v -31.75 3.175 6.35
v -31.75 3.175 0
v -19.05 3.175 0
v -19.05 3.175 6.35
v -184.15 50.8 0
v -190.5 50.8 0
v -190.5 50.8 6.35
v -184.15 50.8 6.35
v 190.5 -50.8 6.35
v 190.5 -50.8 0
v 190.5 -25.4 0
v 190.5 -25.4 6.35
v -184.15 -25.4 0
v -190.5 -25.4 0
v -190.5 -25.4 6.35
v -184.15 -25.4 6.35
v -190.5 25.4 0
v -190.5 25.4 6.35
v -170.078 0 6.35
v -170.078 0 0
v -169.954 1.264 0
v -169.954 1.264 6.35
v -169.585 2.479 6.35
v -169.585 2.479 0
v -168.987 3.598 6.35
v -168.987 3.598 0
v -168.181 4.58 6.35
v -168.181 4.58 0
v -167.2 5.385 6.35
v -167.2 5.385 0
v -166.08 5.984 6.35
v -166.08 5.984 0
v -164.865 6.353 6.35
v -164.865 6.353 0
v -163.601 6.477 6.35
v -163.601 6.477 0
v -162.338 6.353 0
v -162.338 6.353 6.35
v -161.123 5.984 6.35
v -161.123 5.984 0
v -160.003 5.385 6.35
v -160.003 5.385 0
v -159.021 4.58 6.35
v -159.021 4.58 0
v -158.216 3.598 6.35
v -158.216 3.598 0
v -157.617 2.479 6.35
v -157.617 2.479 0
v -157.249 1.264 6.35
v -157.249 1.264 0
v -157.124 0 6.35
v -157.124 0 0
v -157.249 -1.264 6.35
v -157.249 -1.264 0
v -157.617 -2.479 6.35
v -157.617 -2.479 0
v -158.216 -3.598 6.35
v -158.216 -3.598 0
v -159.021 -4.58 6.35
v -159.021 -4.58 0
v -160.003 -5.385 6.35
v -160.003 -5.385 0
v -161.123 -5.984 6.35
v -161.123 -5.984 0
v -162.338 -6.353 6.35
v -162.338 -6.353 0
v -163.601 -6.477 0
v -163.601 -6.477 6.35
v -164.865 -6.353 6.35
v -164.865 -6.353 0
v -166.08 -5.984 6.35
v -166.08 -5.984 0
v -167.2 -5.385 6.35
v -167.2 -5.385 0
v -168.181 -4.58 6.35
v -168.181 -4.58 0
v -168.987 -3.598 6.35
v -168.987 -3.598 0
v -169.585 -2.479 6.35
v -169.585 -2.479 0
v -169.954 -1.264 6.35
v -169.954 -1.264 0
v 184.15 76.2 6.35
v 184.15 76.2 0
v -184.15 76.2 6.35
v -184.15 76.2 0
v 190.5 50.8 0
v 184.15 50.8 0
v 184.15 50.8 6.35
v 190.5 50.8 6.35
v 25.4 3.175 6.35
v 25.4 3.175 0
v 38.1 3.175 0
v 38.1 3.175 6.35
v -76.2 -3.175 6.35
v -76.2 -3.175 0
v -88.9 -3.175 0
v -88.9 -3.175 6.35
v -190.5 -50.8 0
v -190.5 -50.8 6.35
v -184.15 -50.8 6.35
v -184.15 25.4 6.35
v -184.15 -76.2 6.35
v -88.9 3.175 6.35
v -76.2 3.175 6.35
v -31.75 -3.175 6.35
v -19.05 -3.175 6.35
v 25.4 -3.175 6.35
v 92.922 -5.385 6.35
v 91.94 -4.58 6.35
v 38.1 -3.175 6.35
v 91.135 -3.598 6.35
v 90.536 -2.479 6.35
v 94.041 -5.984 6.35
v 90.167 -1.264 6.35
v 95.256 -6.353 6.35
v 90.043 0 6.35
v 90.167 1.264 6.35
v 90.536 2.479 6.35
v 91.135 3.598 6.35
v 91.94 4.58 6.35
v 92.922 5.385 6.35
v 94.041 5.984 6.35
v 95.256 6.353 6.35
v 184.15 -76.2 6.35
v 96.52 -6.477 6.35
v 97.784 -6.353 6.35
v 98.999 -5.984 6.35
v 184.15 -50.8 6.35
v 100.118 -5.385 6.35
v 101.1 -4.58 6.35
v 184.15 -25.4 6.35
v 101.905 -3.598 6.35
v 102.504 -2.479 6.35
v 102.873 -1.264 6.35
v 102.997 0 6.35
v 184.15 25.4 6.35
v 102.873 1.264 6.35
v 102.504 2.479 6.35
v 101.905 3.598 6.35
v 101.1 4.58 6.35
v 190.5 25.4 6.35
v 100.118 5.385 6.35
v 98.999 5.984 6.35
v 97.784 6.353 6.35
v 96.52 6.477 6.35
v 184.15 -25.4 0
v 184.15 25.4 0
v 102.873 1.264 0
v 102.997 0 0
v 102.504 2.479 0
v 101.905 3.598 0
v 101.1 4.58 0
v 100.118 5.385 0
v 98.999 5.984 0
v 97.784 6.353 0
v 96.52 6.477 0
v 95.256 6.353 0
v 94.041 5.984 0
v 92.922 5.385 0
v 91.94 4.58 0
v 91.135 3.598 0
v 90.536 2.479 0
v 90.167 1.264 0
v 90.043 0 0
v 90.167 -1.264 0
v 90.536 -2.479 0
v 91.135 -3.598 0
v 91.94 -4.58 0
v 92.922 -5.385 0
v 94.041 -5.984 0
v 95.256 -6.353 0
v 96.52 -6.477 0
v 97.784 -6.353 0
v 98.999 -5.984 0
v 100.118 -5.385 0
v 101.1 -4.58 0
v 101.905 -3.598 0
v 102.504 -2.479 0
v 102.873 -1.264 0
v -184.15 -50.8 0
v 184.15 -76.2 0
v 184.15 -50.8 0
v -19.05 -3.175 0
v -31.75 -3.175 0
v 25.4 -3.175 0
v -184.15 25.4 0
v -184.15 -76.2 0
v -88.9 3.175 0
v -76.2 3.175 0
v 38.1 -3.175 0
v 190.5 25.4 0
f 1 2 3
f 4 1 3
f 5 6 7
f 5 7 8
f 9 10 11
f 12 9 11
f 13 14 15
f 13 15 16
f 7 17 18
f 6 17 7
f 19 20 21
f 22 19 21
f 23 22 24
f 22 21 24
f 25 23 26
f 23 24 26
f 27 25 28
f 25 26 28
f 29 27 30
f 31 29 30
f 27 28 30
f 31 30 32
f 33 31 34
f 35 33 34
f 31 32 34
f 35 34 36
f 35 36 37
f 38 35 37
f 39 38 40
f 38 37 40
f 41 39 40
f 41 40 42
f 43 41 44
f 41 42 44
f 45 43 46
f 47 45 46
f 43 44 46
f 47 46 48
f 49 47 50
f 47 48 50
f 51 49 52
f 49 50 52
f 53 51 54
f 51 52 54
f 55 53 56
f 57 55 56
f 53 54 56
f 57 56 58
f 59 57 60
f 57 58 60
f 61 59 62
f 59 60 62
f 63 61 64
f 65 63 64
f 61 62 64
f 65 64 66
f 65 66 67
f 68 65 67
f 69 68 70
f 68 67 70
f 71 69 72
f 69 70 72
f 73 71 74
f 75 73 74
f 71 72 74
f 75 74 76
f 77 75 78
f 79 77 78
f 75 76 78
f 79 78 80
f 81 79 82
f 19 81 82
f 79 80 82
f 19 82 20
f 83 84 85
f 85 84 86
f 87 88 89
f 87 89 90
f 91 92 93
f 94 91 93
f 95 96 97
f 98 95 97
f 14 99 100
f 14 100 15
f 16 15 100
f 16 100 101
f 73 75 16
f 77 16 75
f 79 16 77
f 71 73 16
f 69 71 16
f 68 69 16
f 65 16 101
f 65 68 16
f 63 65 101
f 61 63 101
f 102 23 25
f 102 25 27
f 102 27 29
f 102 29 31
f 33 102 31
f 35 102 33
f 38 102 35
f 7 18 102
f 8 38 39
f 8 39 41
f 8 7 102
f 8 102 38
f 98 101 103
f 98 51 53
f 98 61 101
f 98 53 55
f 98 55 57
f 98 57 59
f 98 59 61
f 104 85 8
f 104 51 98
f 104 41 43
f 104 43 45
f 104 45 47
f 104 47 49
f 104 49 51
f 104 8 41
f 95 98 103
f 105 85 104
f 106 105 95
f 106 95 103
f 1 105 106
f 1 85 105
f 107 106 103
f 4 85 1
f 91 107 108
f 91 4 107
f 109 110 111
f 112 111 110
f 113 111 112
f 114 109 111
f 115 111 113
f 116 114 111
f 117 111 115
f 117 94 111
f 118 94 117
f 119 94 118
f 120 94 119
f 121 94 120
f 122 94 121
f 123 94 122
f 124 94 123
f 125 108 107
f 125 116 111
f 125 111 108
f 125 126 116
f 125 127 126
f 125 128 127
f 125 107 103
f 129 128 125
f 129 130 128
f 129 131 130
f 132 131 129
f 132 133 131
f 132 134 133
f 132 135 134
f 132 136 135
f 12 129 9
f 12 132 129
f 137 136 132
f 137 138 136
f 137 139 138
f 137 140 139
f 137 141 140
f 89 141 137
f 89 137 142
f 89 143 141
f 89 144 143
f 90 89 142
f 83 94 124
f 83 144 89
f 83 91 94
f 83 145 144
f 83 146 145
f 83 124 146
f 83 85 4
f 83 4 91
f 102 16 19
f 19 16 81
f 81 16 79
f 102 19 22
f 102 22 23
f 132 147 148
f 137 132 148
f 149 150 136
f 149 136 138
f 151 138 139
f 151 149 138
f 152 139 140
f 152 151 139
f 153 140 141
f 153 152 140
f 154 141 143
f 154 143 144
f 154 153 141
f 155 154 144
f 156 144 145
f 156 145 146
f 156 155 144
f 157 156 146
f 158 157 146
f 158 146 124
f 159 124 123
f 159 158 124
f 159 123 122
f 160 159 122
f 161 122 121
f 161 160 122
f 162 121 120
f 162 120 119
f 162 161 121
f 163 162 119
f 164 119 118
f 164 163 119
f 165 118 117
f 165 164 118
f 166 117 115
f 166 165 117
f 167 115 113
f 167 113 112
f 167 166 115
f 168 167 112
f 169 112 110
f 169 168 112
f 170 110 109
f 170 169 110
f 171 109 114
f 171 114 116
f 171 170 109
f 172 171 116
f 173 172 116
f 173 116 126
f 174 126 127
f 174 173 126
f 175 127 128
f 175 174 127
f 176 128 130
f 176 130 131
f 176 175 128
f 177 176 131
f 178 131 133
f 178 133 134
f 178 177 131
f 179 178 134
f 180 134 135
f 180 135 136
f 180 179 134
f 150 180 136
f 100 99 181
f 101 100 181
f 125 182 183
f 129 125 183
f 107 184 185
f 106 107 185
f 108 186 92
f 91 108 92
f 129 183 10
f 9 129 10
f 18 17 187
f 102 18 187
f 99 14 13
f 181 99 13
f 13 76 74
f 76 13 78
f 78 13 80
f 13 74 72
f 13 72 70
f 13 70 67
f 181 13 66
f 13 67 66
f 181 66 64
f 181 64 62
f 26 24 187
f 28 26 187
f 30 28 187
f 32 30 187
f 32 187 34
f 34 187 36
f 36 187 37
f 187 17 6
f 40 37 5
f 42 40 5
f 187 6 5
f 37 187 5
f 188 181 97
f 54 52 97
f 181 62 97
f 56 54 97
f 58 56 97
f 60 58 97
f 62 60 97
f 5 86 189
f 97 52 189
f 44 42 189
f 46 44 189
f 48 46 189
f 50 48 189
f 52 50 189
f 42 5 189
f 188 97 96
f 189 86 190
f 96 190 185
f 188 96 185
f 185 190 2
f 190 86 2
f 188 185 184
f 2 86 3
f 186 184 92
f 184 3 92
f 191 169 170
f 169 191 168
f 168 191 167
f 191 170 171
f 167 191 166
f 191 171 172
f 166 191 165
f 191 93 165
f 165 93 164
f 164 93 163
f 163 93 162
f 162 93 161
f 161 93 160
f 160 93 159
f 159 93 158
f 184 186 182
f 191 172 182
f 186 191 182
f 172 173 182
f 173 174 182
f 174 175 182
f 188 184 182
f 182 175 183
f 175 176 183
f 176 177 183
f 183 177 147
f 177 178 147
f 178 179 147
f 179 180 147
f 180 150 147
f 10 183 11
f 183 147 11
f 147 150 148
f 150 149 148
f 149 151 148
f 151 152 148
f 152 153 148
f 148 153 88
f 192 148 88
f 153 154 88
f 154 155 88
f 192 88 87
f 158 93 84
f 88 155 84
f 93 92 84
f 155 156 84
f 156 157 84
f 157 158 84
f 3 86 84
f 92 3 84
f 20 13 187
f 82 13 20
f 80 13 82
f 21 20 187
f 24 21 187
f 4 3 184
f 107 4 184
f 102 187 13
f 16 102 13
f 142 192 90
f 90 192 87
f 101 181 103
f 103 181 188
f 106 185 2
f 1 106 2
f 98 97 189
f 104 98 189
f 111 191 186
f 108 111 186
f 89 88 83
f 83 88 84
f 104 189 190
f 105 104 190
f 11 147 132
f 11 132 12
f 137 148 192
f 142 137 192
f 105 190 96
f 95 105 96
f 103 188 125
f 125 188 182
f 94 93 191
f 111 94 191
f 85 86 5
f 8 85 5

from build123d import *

# Parameters (mm, degrees)
F0_R     = 6.477
F1_DEPTH = 6.35
F0_W     = 6.35
F0_H     = 25.4
F2_DEPTH = 6.35
F3_DEPTH = 6.35
F4_DEPTH = 6.35
F5_DEPTH = 6.35


with BuildPart() as f1:
    # F0 (on Top) → F1 (new body)
    with BuildSketch(Plane.XY):
        Polygon((184.15, 76.2), (-184.15, 76.2), (-184.15, 50.8), (-184.15, 25.4), (-184.15, 0), (-184.15, -25.4), (-184.15, -50.8), (-184.15, -76.2), (184.15, -76.2), (184.15, -50.8), (184.15, -25.4), (184.15, 0), (184.15, 25.4), (184.15, 50.8), align=None)
        with BuildLine():
            ThreePointArc((-157.1244, 0), (-163.6014, -6.477), (-170.0784, 0))
            ThreePointArc((-170.0784, 0), (-163.6014, 6.477), (-157.1244, 0))
        make_face(mode=Mode.SUBTRACT)
        Polygon((-88.9, -3.175), (-88.9, 0), (-88.9, 3.175), (-76.2, 3.175), (-76.2, 0), (-76.2, -3.175), align=None, mode=Mode.SUBTRACT)
        Polygon((-31.75, -3.175), (-31.75, 0), (-31.75, 3.175), (-19.05, 3.175), (-19.05, 0), (-19.05, -3.175), align=None, mode=Mode.SUBTRACT)
        Polygon((25.4, -3.175), (25.4, 0), (25.4, 3.175), (38.1, 3.175), (38.1, 0), (38.1, -3.175), align=None, mode=Mode.SUBTRACT)
        with Locations((96.52, 0)):
            Circle(F0_R, mode=Mode.SUBTRACT)
    extrude(amount=F1_DEPTH)

    # F0 (on Top) → F2 (join)
    with BuildSketch(Plane.XY):
        with Locations((187.325, -38.1)):
            Rectangle(F0_W, F0_H)
    extrude(amount=F2_DEPTH)

    # F0 (on Top) → F3 (join)
    with BuildSketch(Plane.XY):
        with Locations((187.325, 38.1)):
            Rectangle(F0_W, F0_H)
    extrude(amount=F3_DEPTH)

    # F0 (on Top) → F4 (join)
    with BuildSketch(Plane.XY):
        with Locations((-187.325, -38.1)):
            Rectangle(F0_W, F0_H)
    extrude(amount=F4_DEPTH)

    # F0 (on Top) → F5 (join)
    with BuildSketch(Plane.XY):
        with Locations((-187.325, 38.1)):
            Rectangle(F0_W, F0_H)
    extrude(amount=F5_DEPTH)


solid = f1.part
